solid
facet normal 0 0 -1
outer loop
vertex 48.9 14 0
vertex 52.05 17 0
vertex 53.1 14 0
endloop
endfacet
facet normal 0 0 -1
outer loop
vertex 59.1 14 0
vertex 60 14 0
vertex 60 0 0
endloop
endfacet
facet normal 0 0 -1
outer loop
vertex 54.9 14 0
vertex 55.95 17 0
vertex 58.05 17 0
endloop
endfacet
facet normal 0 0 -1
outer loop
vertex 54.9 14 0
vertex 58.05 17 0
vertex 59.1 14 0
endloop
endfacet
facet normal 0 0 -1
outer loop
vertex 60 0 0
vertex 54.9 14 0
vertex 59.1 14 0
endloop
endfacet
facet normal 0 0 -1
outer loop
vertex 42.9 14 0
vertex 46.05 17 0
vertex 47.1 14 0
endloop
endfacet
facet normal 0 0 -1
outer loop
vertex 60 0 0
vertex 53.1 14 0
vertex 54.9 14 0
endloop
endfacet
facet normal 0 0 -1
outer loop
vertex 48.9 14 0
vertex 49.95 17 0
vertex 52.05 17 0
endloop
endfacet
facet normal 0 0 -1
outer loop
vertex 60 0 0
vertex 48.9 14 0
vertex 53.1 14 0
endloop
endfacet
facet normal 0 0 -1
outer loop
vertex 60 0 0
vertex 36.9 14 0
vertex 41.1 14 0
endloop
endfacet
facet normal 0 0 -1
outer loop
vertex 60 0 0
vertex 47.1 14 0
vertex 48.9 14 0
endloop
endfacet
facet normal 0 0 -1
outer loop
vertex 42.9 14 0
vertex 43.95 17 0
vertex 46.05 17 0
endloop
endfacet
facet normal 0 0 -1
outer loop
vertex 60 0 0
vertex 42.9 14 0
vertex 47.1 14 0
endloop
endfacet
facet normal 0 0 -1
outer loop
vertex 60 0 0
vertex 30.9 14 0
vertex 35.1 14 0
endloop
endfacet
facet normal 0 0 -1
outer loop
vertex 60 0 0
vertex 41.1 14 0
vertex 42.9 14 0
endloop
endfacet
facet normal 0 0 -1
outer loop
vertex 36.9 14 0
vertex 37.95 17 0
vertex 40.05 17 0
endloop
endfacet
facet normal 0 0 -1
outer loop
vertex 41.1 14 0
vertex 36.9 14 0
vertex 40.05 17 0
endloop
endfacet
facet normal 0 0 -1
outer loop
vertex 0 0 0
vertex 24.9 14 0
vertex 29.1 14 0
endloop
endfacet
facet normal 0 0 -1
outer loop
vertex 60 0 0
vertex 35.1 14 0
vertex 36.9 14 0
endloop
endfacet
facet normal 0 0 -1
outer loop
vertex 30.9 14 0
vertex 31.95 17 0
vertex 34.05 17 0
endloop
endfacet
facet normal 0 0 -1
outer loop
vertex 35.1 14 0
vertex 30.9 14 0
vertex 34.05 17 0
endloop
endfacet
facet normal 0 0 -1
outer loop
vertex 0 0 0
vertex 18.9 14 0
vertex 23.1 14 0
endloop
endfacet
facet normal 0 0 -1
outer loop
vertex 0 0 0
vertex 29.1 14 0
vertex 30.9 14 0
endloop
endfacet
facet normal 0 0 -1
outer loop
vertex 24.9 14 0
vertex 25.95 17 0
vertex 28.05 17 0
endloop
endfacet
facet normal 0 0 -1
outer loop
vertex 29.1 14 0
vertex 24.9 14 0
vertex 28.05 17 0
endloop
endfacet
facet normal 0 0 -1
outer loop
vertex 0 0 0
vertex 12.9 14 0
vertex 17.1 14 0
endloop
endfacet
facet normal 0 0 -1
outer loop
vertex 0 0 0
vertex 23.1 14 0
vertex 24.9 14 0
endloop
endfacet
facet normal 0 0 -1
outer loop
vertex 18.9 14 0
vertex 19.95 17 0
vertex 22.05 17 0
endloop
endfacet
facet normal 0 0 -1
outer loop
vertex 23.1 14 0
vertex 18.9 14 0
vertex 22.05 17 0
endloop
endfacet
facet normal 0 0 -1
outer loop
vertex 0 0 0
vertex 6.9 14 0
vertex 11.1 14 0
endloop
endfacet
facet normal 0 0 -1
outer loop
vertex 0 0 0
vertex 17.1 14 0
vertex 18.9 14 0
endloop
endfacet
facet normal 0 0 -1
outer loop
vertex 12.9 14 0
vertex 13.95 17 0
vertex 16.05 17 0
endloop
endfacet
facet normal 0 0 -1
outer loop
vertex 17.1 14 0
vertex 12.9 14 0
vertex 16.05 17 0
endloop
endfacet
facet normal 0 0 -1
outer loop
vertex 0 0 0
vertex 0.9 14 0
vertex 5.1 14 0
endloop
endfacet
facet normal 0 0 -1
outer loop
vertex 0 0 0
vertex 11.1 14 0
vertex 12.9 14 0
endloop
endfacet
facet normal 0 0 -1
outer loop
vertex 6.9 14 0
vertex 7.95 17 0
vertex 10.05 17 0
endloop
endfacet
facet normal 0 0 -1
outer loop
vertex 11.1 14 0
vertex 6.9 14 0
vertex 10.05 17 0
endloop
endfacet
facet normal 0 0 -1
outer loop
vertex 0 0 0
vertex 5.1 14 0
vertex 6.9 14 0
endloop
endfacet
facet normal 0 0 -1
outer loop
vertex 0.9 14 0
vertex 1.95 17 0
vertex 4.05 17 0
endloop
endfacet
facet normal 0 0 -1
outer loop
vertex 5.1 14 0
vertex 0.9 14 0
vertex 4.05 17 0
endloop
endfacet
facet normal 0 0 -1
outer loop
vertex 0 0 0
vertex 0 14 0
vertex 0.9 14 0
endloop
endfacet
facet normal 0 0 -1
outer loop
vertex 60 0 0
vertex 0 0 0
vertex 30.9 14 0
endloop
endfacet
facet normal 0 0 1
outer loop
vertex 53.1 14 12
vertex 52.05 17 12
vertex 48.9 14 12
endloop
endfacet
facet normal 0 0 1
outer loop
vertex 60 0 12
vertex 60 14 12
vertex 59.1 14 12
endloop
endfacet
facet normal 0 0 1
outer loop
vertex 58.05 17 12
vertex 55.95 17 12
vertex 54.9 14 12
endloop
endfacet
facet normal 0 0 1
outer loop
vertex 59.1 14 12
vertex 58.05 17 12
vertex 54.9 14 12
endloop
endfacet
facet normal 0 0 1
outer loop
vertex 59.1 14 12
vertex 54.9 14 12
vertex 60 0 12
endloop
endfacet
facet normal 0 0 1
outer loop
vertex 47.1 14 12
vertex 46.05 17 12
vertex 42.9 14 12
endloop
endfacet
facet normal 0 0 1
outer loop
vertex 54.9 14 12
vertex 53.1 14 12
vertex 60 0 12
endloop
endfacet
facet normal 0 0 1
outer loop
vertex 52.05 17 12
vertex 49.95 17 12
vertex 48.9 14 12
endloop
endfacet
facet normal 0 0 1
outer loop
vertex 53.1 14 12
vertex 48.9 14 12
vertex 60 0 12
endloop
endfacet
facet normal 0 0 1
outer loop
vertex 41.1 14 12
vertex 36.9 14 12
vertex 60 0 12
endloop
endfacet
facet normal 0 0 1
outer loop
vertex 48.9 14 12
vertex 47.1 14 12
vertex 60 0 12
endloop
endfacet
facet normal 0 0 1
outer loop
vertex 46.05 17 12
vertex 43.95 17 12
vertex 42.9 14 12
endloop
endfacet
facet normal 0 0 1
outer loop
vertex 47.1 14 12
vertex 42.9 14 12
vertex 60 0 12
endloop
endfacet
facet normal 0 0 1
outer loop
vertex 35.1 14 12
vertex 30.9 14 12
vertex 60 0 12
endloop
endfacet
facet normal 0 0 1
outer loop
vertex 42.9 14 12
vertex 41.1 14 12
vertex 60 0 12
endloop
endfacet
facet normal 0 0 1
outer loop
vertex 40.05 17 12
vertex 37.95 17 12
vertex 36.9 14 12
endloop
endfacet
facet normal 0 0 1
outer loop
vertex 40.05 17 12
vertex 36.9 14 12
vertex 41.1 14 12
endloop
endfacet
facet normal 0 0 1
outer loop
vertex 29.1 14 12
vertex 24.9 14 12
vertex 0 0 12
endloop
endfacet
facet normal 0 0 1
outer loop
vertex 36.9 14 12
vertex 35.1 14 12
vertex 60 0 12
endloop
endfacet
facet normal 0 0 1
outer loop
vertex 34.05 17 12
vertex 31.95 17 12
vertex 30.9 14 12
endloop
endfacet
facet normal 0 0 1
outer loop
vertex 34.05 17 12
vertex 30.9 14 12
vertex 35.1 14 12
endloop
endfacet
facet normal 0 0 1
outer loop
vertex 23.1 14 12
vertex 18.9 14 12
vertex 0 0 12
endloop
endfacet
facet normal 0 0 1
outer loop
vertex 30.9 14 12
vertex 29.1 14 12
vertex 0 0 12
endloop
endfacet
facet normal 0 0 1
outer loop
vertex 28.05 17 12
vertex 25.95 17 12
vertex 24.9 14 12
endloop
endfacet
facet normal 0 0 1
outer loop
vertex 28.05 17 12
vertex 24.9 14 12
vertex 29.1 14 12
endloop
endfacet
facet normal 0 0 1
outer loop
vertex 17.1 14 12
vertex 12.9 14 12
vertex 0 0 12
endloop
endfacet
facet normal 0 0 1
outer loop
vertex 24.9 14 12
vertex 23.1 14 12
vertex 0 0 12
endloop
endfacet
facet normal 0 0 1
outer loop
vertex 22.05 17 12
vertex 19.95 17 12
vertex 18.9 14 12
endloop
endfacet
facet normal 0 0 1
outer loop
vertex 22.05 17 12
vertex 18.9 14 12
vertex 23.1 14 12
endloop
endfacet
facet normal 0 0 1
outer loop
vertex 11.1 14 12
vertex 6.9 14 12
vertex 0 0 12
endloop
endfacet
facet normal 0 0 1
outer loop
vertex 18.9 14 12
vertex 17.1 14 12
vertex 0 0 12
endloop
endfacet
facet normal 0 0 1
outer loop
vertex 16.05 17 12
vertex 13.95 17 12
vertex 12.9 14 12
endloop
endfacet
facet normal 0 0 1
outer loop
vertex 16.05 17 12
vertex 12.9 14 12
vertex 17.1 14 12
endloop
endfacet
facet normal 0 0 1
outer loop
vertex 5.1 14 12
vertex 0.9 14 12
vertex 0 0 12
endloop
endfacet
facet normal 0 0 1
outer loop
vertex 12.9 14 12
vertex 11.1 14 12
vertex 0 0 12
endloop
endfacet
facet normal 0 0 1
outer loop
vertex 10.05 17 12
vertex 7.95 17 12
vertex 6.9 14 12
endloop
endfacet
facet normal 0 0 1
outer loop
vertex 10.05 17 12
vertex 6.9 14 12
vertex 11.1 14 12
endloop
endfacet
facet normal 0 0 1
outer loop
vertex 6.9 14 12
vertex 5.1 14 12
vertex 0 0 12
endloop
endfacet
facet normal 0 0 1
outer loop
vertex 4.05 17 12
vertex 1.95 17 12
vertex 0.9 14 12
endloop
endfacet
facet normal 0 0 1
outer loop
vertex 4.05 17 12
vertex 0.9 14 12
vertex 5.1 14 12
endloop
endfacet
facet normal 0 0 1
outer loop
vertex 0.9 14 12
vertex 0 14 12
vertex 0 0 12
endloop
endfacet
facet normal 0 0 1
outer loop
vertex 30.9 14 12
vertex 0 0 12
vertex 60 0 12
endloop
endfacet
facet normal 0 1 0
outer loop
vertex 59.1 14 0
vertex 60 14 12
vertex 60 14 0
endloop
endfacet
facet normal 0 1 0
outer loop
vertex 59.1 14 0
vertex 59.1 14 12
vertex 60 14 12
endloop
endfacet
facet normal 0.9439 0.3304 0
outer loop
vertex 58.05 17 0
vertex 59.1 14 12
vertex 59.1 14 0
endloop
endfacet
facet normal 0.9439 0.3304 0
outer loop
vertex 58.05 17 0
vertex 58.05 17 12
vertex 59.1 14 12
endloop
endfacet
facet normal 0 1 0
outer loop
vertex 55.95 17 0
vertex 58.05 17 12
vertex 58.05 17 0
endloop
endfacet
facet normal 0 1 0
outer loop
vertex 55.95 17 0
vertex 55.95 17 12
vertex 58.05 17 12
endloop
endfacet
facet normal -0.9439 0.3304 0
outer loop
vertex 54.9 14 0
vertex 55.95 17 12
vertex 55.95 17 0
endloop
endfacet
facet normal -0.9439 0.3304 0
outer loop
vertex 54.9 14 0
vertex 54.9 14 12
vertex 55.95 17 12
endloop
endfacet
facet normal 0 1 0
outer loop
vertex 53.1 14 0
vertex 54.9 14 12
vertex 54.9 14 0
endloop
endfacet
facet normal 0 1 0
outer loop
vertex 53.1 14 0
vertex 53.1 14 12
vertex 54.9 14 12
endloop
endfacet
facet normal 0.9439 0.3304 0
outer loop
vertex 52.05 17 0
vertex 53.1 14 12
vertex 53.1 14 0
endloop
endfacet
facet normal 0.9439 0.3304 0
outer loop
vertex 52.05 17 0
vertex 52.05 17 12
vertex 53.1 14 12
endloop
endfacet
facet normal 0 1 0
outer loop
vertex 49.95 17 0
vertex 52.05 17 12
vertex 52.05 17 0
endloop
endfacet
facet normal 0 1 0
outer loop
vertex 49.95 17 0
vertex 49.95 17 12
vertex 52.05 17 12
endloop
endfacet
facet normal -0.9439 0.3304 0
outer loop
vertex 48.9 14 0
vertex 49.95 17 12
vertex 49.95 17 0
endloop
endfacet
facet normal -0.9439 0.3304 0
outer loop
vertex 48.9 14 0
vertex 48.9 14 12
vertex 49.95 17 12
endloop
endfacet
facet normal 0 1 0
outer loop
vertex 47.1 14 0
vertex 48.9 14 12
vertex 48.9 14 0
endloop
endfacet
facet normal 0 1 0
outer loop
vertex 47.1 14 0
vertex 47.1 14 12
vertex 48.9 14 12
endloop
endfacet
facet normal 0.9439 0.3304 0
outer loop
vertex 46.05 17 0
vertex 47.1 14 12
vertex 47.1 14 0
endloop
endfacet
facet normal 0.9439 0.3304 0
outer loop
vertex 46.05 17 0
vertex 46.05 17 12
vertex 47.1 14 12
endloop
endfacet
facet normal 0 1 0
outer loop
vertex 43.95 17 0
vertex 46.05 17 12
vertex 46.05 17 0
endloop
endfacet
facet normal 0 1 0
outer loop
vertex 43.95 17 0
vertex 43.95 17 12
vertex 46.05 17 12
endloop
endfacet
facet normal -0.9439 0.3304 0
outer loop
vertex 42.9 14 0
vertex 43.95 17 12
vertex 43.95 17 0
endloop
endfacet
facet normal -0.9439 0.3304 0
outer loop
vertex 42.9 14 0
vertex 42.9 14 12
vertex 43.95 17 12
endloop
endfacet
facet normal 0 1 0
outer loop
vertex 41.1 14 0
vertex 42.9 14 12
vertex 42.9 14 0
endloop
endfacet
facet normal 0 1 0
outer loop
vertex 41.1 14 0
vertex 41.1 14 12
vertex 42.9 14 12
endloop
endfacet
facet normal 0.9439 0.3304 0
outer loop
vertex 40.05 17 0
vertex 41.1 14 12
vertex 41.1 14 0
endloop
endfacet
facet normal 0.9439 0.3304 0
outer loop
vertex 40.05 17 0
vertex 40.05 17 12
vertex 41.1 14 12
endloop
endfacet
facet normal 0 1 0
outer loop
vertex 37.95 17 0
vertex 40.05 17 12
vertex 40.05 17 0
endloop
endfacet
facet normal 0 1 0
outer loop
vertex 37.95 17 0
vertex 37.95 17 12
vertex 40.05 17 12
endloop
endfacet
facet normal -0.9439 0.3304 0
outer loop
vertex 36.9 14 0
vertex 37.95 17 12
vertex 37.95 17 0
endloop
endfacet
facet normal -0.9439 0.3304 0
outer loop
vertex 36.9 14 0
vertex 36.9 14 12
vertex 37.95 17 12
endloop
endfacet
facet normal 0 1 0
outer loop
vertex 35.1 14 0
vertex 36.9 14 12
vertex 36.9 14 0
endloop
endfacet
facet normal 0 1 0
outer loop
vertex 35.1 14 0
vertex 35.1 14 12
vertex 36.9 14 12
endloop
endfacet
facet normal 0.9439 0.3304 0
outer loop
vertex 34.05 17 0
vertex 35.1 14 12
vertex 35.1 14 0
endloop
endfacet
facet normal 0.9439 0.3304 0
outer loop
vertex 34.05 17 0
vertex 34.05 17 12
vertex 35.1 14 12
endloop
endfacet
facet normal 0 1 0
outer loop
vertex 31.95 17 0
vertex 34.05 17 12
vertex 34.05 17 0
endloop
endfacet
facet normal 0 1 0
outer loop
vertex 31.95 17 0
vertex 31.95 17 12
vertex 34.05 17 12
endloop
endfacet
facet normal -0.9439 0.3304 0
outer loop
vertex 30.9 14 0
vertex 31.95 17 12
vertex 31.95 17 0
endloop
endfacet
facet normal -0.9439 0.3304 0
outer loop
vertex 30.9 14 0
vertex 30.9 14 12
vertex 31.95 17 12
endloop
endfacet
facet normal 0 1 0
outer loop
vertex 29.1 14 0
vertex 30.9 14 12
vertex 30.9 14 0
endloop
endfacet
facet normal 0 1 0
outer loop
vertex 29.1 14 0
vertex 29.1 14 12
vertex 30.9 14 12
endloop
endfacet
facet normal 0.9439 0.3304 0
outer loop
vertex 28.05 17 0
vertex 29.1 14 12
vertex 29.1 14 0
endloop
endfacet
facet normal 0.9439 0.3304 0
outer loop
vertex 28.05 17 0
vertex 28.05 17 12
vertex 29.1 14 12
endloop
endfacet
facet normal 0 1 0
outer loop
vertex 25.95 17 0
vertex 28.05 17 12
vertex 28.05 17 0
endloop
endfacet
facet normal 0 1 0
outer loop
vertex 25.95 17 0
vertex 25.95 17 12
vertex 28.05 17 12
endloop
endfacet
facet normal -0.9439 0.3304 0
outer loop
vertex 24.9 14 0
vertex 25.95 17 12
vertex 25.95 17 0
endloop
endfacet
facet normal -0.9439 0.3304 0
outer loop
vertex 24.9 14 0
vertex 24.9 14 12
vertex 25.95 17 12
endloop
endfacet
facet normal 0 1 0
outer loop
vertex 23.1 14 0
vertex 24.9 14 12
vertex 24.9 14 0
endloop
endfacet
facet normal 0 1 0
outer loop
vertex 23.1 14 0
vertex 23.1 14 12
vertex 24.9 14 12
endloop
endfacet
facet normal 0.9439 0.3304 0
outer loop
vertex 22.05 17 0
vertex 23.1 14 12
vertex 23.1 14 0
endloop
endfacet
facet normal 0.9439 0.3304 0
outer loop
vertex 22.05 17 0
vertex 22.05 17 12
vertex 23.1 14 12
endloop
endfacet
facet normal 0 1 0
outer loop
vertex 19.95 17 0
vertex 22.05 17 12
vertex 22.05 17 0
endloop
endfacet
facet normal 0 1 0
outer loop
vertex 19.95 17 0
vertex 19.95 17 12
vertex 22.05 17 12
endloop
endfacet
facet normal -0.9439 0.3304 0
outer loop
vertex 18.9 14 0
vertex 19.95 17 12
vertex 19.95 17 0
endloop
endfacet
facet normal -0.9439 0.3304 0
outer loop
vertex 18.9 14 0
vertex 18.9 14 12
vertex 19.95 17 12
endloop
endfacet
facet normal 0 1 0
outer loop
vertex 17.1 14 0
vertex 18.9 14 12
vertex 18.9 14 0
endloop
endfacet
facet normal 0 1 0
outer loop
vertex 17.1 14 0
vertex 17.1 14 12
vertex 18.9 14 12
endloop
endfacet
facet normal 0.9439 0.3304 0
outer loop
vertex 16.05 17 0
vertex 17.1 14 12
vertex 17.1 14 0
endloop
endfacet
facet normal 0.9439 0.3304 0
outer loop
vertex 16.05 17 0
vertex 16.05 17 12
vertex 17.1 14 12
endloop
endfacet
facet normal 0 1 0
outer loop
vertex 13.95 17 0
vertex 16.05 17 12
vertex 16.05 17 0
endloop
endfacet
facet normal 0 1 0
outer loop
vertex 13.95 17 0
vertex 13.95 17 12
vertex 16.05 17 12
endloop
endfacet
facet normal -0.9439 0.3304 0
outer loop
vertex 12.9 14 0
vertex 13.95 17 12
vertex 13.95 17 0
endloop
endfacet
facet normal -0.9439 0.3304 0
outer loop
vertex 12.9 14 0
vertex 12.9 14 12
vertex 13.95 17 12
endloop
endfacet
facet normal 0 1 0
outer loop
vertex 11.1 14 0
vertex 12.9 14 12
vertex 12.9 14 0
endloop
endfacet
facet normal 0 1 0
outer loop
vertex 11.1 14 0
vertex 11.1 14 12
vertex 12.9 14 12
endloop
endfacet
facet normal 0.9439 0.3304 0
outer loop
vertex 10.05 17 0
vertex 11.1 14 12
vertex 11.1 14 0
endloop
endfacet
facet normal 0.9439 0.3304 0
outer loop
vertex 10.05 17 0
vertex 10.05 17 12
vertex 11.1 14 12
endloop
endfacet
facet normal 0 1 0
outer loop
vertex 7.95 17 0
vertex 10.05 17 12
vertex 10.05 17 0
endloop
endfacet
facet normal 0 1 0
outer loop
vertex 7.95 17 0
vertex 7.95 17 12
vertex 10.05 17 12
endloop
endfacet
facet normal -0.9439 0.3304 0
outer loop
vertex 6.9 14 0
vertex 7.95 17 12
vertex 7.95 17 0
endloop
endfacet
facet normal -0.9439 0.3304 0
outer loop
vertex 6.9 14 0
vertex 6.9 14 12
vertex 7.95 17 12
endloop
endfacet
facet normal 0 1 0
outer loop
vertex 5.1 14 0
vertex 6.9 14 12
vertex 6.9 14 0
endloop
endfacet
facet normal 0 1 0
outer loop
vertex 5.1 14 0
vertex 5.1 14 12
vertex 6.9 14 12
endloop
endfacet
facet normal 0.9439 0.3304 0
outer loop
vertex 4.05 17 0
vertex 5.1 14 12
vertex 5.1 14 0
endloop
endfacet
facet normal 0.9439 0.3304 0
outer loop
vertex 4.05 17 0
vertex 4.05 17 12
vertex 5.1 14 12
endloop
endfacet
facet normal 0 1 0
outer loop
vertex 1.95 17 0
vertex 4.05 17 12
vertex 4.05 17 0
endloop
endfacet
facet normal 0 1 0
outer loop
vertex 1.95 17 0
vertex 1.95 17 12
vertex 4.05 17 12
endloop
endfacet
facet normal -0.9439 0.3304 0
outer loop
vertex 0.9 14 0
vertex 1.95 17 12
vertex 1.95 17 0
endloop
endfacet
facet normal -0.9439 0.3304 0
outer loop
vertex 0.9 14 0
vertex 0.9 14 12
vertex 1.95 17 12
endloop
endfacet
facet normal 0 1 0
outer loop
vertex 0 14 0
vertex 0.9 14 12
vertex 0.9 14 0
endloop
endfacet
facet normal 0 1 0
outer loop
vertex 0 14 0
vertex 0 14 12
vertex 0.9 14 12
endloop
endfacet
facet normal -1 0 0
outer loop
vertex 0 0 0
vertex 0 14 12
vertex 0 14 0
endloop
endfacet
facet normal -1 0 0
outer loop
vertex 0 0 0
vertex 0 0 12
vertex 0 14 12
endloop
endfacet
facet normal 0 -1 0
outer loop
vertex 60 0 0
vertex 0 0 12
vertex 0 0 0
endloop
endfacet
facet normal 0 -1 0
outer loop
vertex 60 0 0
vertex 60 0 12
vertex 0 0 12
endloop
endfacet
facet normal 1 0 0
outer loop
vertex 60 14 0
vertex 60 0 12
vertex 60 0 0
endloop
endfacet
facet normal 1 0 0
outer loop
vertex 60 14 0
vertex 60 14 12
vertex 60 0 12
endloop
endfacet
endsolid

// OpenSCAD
$fn = 32;

// ----------------------------------------------------------------------
// Gear rack: 10 teeth, pitch 6 mm
// ----------------------------------------------------------------------

// --- parameters (mm) ---
teeth = 10;               // number of teeth
pitch = 6;                // tooth pitch, X
root_w = 4.2;             // tooth width at the root
tip_w = 2.1;              // tooth width at the tip
base_h = 14;              // rack body height, Y
tooth_h = 3;              // tooth height above the body
plate_t = 12;             // rack width, Z (extrusion height)
fit_tol = 0.1;            // declared fit tolerance (prompt contract)
free_tol = 0.3;           // declared free tolerance (prompt contract)

rack_l = teeth * pitch;  // overall length
total_h = base_h + tooth_h;  // overall height

profile = [[0, 0], [60, 0], [60, 14], [59.1, 14], [58.05, 17], [55.95, 17], [54.9, 14], [53.1, 14], [52.05, 17], [49.95, 17], [48.9, 14], [47.1, 14], [46.05, 17], [43.95, 17], [42.9, 14], [41.1, 14], [40.05, 17], [37.95, 17], [36.9, 14], [35.1, 14], [34.05, 17], [31.95, 17], [30.9, 14], [29.1, 14], [28.05, 17], [25.95, 17], [24.9, 14], [23.1, 14], [22.05, 17], [19.95, 17], [18.9, 14], [17.1, 14], [16.05, 17], [13.95, 17], [12.9, 14], [11.1, 14], [10.05, 17], [7.95, 17], [6.9, 14], [5.1, 14], [4.05, 17], [1.95, 17], [0.9, 14], [0, 14]];  // primary outline, 44 points, counter clockwise

// --- the one profile operation ---
linear_extrude(height = plate_t) polygon(points = profile);
